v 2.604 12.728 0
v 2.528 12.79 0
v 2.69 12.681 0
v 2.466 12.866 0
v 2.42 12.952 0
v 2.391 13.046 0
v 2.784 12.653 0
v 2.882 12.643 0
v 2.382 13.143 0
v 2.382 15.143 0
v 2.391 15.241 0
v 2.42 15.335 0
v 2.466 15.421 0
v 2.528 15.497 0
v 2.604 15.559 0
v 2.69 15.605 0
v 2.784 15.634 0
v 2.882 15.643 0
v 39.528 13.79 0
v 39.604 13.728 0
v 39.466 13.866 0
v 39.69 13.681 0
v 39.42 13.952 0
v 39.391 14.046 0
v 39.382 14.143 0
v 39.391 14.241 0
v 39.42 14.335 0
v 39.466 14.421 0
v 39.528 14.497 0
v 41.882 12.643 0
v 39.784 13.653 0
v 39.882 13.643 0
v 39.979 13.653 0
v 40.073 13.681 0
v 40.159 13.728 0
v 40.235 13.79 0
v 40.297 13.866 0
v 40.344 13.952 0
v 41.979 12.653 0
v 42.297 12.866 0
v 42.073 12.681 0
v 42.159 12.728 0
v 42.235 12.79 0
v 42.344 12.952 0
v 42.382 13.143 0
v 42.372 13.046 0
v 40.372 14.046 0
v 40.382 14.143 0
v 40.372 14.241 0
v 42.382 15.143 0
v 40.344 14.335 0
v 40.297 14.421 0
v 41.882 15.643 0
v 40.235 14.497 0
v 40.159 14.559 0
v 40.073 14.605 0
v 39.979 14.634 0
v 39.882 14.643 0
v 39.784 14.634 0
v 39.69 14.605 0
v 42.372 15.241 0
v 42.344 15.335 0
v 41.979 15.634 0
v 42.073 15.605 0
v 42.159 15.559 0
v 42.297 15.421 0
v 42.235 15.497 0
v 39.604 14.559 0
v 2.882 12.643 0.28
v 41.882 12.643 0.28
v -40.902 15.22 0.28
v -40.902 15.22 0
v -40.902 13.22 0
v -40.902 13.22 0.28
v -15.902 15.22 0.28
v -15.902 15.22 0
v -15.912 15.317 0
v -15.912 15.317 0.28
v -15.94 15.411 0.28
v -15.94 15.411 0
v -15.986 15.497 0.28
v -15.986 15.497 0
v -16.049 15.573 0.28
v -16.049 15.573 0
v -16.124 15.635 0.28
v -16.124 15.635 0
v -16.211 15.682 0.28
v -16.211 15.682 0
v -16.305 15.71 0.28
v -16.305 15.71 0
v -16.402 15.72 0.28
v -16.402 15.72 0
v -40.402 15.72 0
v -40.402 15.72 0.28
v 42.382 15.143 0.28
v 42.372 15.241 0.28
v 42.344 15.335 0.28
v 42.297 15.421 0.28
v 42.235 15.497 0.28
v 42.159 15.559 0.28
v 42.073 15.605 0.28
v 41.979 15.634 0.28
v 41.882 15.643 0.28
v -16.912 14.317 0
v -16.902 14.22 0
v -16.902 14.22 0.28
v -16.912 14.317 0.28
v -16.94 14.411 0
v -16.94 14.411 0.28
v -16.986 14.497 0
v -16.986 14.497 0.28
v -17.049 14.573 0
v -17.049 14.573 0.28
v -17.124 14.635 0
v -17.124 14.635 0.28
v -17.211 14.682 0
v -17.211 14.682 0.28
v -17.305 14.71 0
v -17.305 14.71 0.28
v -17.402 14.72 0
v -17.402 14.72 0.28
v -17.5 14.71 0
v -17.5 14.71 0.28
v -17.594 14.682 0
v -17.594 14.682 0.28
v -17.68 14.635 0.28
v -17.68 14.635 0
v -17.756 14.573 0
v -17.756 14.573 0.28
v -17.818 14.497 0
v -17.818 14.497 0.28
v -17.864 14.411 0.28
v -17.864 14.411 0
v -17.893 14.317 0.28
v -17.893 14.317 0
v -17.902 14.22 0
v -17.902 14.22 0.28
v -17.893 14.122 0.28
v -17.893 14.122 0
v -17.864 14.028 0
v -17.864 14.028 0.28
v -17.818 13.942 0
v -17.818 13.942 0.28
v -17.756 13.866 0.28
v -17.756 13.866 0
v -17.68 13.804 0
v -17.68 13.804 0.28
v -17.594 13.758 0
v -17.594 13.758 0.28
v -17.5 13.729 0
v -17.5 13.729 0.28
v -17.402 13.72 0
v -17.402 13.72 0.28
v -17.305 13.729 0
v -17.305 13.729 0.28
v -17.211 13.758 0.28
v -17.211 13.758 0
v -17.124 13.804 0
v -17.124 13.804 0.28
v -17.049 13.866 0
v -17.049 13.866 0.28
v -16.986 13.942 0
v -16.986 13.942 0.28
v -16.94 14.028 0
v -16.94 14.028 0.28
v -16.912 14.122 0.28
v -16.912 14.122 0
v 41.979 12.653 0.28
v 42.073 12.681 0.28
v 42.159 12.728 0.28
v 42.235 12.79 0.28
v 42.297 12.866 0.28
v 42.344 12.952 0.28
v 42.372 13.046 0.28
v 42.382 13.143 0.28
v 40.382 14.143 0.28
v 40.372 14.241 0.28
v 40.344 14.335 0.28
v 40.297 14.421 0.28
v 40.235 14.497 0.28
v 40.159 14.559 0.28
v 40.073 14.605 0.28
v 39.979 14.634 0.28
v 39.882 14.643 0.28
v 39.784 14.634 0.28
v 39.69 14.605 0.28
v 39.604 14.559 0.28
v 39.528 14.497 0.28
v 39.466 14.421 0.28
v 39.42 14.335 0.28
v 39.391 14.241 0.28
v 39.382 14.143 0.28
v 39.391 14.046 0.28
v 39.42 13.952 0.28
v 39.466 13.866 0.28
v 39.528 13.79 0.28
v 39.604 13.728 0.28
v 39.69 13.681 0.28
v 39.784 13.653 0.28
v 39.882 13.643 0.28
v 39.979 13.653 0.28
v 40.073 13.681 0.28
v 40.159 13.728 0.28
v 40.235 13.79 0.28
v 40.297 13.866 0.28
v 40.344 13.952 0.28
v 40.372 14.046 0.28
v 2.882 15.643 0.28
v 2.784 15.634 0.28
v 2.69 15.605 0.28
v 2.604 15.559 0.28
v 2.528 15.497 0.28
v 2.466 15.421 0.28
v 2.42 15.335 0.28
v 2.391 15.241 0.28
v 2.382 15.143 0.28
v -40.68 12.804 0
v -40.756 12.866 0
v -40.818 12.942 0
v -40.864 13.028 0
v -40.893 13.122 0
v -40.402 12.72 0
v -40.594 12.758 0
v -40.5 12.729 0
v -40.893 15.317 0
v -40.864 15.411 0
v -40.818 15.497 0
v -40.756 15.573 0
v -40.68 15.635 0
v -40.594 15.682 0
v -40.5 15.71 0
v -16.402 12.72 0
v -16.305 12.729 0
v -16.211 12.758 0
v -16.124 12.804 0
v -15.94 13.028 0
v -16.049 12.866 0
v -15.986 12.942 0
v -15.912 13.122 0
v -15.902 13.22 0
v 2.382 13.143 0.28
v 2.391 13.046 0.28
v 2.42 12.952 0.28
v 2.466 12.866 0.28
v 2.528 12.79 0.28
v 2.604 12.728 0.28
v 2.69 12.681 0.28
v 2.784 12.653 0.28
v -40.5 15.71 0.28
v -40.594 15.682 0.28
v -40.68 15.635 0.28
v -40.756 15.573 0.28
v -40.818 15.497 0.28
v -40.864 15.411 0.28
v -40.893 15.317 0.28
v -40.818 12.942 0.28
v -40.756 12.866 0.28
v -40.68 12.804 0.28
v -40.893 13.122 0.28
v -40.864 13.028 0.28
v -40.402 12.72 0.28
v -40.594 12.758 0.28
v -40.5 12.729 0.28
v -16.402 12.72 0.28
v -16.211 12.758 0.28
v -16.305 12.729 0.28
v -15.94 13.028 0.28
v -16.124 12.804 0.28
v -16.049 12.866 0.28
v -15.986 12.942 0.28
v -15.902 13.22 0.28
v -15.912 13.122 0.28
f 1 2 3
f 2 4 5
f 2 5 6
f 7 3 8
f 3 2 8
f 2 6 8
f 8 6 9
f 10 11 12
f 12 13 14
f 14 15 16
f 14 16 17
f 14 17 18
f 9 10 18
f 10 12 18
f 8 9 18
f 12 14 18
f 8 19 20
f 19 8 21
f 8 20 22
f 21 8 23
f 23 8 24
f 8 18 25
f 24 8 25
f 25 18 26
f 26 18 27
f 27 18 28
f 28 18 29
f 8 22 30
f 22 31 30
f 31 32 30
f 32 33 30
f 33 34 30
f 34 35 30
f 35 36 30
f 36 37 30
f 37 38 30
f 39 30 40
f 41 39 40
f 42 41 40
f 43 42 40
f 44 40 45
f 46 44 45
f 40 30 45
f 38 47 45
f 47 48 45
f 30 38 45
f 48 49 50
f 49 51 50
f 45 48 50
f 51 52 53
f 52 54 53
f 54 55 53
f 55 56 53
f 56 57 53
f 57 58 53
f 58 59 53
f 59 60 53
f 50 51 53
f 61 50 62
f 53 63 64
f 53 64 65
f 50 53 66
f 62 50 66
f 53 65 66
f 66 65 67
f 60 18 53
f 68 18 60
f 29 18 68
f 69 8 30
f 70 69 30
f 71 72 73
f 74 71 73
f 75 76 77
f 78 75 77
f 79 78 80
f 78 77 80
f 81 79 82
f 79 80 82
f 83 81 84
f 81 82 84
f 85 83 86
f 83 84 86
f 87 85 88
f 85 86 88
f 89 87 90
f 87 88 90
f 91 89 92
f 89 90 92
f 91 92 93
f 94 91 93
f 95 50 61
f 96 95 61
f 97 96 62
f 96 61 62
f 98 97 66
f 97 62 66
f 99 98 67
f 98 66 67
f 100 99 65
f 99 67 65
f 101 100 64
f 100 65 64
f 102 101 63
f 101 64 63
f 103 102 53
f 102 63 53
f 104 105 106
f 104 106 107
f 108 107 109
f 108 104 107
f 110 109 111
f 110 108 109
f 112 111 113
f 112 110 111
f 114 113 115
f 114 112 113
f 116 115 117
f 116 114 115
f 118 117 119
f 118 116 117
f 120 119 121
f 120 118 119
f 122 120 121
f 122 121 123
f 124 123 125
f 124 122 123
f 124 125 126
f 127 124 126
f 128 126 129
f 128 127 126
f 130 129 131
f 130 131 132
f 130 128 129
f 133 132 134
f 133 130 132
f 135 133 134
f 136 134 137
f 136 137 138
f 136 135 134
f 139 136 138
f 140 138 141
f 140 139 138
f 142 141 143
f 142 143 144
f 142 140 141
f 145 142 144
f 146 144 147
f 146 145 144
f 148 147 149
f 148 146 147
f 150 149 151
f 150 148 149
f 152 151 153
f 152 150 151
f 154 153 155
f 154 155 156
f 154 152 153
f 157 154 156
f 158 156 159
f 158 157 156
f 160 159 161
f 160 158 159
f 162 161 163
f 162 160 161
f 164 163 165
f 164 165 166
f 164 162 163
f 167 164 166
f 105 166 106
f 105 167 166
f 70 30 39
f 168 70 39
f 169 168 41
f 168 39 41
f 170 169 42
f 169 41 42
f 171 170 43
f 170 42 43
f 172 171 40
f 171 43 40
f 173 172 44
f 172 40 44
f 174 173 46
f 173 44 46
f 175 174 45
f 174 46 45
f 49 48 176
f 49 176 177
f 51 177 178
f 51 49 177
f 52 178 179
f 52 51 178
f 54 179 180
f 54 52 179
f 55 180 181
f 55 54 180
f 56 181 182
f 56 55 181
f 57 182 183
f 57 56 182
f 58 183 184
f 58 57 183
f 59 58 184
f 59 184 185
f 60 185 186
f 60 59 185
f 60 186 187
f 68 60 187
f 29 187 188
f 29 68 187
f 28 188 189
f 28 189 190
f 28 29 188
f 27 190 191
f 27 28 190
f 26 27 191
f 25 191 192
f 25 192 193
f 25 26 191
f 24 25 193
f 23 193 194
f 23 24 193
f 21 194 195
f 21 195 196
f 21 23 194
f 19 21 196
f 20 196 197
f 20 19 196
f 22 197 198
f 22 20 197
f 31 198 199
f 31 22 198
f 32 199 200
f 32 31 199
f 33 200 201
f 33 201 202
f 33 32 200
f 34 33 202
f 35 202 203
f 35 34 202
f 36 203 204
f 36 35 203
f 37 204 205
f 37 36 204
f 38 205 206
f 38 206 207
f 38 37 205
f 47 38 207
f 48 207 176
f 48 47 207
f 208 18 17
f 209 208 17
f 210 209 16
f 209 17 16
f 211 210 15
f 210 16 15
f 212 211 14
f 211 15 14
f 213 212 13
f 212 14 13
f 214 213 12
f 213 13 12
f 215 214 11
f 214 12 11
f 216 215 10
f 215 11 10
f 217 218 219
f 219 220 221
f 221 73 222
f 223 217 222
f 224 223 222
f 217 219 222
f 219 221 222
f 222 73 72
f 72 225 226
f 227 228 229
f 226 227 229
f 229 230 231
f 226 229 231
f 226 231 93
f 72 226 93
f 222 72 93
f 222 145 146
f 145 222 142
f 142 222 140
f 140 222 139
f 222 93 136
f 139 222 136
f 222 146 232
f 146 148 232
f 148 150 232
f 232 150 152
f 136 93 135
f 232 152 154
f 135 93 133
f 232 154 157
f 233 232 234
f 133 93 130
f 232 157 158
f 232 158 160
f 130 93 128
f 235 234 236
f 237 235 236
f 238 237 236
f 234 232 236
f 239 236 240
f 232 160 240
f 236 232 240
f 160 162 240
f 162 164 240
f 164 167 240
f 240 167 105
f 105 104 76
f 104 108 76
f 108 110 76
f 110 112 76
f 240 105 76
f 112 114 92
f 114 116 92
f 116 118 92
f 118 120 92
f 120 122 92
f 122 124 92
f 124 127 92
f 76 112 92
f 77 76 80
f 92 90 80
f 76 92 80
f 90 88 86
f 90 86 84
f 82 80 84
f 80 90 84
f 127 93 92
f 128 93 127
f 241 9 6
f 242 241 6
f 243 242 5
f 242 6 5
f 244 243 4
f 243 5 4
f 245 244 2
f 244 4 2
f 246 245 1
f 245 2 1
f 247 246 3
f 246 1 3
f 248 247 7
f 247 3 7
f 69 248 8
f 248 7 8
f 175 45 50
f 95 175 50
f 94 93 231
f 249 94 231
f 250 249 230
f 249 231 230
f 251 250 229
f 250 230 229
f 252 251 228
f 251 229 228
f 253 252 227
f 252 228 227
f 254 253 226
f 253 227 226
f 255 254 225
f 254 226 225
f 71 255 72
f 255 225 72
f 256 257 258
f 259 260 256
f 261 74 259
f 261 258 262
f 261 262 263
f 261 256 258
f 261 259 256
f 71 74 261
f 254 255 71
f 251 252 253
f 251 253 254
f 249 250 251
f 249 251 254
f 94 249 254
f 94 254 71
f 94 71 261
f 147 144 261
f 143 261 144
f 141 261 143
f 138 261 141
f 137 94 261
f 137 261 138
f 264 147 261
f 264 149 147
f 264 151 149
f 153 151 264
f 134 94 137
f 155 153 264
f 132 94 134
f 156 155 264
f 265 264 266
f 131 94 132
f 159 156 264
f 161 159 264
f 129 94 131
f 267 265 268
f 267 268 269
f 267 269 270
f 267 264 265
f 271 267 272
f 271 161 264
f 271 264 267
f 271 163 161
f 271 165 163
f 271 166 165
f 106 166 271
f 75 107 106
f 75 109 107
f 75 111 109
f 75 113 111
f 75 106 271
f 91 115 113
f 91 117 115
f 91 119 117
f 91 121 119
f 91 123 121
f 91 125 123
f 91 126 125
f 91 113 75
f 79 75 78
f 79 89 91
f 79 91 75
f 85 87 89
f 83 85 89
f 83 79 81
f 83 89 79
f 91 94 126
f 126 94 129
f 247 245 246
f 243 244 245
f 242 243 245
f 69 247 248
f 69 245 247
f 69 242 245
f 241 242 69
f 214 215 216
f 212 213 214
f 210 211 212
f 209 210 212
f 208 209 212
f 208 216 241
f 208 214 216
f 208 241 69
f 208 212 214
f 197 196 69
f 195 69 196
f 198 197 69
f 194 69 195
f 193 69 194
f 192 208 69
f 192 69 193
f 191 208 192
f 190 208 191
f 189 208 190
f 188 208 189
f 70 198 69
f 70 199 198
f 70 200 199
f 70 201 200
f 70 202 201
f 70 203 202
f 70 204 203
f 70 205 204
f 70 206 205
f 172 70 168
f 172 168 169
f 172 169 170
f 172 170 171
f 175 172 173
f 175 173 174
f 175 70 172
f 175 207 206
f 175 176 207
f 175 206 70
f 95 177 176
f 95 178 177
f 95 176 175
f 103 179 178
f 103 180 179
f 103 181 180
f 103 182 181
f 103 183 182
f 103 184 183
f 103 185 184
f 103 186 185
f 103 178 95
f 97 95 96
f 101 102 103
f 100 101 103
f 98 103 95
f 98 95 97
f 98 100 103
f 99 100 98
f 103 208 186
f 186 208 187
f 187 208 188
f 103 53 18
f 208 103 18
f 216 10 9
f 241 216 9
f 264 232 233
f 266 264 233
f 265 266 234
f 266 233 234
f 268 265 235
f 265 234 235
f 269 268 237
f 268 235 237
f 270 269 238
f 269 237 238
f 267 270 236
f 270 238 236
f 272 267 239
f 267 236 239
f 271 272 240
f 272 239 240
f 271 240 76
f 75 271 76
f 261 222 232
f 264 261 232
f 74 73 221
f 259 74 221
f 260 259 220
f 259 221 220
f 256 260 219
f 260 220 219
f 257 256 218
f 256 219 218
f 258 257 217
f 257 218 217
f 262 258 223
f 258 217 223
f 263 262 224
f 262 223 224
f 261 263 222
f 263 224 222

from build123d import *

# Parameters (mm, degrees)
F0_R     = 0.5
F1_DEPTH = 0.28
F2_R     = 0.5
F3_DEPTH = 0.28


with BuildPart() as f1:
    # F0 (on Top) → F1 (new body)
    with BuildSketch(Plane.XY):
        with BuildLine():
            ThreePointArc((2.381673, 13.143352), (2.52812, 12.789798), (2.881673, 12.643352))
            Line((2.881673, 12.643352), (41.881673, 12.643352))
            ThreePointArc((41.881673, 12.643352), (42.235227, 12.789798), (42.381673, 13.143352))
            Line((42.381673, 13.143352), (42.381673, 15.143352))
            ThreePointArc((42.381673, 15.143352), (42.235227, 15.496905), (41.881673, 15.643352))
            Line((41.881673, 15.643352), (2.881673, 15.643352))
            ThreePointArc((2.881673, 15.643352), (2.52812, 15.496905), (2.381673, 15.143352))
            Line((2.381673, 15.143352), (2.381673, 13.143352))
        make_face()
        with Locations((39.881673, 14.143352)):
            Circle(F0_R, mode=Mode.SUBTRACT)
    extrude(amount=F1_DEPTH)


with BuildPart() as f3:
    # F2 (on Top) → F3 (new body)
    with BuildSketch(Plane.XY):
        with BuildLine():
            ThreePointArc((-40.902233, 13.219685), (-40.755786, 12.866132), (-40.402233, 12.719685))
            Line((-40.402233, 12.719685), (-16.402233, 12.719685))
            ThreePointArc((-16.402233, 12.719685), (-16.04868, 12.866132), (-15.902233, 13.219685))
            Line((-15.902233, 13.219685), (-15.902233, 15.219685))
            ThreePointArc((-15.902233, 15.219685), (-16.04868, 15.573239), (-16.402233, 15.719685))
            Line((-16.402233, 15.719685), (-40.402233, 15.719685))
            ThreePointArc((-40.402233, 15.719685), (-40.755786, 15.573239), (-40.902233, 15.219685))
            Line((-40.902233, 15.219685), (-40.902233, 13.219685))
        make_face()
        with Locations((-17.402233, 14.219685)):
            Circle(F2_R, mode=Mode.SUBTRACT)
    extrude(amount=F3_DEPTH)


solid = Compound([f1.part, f3.part])
